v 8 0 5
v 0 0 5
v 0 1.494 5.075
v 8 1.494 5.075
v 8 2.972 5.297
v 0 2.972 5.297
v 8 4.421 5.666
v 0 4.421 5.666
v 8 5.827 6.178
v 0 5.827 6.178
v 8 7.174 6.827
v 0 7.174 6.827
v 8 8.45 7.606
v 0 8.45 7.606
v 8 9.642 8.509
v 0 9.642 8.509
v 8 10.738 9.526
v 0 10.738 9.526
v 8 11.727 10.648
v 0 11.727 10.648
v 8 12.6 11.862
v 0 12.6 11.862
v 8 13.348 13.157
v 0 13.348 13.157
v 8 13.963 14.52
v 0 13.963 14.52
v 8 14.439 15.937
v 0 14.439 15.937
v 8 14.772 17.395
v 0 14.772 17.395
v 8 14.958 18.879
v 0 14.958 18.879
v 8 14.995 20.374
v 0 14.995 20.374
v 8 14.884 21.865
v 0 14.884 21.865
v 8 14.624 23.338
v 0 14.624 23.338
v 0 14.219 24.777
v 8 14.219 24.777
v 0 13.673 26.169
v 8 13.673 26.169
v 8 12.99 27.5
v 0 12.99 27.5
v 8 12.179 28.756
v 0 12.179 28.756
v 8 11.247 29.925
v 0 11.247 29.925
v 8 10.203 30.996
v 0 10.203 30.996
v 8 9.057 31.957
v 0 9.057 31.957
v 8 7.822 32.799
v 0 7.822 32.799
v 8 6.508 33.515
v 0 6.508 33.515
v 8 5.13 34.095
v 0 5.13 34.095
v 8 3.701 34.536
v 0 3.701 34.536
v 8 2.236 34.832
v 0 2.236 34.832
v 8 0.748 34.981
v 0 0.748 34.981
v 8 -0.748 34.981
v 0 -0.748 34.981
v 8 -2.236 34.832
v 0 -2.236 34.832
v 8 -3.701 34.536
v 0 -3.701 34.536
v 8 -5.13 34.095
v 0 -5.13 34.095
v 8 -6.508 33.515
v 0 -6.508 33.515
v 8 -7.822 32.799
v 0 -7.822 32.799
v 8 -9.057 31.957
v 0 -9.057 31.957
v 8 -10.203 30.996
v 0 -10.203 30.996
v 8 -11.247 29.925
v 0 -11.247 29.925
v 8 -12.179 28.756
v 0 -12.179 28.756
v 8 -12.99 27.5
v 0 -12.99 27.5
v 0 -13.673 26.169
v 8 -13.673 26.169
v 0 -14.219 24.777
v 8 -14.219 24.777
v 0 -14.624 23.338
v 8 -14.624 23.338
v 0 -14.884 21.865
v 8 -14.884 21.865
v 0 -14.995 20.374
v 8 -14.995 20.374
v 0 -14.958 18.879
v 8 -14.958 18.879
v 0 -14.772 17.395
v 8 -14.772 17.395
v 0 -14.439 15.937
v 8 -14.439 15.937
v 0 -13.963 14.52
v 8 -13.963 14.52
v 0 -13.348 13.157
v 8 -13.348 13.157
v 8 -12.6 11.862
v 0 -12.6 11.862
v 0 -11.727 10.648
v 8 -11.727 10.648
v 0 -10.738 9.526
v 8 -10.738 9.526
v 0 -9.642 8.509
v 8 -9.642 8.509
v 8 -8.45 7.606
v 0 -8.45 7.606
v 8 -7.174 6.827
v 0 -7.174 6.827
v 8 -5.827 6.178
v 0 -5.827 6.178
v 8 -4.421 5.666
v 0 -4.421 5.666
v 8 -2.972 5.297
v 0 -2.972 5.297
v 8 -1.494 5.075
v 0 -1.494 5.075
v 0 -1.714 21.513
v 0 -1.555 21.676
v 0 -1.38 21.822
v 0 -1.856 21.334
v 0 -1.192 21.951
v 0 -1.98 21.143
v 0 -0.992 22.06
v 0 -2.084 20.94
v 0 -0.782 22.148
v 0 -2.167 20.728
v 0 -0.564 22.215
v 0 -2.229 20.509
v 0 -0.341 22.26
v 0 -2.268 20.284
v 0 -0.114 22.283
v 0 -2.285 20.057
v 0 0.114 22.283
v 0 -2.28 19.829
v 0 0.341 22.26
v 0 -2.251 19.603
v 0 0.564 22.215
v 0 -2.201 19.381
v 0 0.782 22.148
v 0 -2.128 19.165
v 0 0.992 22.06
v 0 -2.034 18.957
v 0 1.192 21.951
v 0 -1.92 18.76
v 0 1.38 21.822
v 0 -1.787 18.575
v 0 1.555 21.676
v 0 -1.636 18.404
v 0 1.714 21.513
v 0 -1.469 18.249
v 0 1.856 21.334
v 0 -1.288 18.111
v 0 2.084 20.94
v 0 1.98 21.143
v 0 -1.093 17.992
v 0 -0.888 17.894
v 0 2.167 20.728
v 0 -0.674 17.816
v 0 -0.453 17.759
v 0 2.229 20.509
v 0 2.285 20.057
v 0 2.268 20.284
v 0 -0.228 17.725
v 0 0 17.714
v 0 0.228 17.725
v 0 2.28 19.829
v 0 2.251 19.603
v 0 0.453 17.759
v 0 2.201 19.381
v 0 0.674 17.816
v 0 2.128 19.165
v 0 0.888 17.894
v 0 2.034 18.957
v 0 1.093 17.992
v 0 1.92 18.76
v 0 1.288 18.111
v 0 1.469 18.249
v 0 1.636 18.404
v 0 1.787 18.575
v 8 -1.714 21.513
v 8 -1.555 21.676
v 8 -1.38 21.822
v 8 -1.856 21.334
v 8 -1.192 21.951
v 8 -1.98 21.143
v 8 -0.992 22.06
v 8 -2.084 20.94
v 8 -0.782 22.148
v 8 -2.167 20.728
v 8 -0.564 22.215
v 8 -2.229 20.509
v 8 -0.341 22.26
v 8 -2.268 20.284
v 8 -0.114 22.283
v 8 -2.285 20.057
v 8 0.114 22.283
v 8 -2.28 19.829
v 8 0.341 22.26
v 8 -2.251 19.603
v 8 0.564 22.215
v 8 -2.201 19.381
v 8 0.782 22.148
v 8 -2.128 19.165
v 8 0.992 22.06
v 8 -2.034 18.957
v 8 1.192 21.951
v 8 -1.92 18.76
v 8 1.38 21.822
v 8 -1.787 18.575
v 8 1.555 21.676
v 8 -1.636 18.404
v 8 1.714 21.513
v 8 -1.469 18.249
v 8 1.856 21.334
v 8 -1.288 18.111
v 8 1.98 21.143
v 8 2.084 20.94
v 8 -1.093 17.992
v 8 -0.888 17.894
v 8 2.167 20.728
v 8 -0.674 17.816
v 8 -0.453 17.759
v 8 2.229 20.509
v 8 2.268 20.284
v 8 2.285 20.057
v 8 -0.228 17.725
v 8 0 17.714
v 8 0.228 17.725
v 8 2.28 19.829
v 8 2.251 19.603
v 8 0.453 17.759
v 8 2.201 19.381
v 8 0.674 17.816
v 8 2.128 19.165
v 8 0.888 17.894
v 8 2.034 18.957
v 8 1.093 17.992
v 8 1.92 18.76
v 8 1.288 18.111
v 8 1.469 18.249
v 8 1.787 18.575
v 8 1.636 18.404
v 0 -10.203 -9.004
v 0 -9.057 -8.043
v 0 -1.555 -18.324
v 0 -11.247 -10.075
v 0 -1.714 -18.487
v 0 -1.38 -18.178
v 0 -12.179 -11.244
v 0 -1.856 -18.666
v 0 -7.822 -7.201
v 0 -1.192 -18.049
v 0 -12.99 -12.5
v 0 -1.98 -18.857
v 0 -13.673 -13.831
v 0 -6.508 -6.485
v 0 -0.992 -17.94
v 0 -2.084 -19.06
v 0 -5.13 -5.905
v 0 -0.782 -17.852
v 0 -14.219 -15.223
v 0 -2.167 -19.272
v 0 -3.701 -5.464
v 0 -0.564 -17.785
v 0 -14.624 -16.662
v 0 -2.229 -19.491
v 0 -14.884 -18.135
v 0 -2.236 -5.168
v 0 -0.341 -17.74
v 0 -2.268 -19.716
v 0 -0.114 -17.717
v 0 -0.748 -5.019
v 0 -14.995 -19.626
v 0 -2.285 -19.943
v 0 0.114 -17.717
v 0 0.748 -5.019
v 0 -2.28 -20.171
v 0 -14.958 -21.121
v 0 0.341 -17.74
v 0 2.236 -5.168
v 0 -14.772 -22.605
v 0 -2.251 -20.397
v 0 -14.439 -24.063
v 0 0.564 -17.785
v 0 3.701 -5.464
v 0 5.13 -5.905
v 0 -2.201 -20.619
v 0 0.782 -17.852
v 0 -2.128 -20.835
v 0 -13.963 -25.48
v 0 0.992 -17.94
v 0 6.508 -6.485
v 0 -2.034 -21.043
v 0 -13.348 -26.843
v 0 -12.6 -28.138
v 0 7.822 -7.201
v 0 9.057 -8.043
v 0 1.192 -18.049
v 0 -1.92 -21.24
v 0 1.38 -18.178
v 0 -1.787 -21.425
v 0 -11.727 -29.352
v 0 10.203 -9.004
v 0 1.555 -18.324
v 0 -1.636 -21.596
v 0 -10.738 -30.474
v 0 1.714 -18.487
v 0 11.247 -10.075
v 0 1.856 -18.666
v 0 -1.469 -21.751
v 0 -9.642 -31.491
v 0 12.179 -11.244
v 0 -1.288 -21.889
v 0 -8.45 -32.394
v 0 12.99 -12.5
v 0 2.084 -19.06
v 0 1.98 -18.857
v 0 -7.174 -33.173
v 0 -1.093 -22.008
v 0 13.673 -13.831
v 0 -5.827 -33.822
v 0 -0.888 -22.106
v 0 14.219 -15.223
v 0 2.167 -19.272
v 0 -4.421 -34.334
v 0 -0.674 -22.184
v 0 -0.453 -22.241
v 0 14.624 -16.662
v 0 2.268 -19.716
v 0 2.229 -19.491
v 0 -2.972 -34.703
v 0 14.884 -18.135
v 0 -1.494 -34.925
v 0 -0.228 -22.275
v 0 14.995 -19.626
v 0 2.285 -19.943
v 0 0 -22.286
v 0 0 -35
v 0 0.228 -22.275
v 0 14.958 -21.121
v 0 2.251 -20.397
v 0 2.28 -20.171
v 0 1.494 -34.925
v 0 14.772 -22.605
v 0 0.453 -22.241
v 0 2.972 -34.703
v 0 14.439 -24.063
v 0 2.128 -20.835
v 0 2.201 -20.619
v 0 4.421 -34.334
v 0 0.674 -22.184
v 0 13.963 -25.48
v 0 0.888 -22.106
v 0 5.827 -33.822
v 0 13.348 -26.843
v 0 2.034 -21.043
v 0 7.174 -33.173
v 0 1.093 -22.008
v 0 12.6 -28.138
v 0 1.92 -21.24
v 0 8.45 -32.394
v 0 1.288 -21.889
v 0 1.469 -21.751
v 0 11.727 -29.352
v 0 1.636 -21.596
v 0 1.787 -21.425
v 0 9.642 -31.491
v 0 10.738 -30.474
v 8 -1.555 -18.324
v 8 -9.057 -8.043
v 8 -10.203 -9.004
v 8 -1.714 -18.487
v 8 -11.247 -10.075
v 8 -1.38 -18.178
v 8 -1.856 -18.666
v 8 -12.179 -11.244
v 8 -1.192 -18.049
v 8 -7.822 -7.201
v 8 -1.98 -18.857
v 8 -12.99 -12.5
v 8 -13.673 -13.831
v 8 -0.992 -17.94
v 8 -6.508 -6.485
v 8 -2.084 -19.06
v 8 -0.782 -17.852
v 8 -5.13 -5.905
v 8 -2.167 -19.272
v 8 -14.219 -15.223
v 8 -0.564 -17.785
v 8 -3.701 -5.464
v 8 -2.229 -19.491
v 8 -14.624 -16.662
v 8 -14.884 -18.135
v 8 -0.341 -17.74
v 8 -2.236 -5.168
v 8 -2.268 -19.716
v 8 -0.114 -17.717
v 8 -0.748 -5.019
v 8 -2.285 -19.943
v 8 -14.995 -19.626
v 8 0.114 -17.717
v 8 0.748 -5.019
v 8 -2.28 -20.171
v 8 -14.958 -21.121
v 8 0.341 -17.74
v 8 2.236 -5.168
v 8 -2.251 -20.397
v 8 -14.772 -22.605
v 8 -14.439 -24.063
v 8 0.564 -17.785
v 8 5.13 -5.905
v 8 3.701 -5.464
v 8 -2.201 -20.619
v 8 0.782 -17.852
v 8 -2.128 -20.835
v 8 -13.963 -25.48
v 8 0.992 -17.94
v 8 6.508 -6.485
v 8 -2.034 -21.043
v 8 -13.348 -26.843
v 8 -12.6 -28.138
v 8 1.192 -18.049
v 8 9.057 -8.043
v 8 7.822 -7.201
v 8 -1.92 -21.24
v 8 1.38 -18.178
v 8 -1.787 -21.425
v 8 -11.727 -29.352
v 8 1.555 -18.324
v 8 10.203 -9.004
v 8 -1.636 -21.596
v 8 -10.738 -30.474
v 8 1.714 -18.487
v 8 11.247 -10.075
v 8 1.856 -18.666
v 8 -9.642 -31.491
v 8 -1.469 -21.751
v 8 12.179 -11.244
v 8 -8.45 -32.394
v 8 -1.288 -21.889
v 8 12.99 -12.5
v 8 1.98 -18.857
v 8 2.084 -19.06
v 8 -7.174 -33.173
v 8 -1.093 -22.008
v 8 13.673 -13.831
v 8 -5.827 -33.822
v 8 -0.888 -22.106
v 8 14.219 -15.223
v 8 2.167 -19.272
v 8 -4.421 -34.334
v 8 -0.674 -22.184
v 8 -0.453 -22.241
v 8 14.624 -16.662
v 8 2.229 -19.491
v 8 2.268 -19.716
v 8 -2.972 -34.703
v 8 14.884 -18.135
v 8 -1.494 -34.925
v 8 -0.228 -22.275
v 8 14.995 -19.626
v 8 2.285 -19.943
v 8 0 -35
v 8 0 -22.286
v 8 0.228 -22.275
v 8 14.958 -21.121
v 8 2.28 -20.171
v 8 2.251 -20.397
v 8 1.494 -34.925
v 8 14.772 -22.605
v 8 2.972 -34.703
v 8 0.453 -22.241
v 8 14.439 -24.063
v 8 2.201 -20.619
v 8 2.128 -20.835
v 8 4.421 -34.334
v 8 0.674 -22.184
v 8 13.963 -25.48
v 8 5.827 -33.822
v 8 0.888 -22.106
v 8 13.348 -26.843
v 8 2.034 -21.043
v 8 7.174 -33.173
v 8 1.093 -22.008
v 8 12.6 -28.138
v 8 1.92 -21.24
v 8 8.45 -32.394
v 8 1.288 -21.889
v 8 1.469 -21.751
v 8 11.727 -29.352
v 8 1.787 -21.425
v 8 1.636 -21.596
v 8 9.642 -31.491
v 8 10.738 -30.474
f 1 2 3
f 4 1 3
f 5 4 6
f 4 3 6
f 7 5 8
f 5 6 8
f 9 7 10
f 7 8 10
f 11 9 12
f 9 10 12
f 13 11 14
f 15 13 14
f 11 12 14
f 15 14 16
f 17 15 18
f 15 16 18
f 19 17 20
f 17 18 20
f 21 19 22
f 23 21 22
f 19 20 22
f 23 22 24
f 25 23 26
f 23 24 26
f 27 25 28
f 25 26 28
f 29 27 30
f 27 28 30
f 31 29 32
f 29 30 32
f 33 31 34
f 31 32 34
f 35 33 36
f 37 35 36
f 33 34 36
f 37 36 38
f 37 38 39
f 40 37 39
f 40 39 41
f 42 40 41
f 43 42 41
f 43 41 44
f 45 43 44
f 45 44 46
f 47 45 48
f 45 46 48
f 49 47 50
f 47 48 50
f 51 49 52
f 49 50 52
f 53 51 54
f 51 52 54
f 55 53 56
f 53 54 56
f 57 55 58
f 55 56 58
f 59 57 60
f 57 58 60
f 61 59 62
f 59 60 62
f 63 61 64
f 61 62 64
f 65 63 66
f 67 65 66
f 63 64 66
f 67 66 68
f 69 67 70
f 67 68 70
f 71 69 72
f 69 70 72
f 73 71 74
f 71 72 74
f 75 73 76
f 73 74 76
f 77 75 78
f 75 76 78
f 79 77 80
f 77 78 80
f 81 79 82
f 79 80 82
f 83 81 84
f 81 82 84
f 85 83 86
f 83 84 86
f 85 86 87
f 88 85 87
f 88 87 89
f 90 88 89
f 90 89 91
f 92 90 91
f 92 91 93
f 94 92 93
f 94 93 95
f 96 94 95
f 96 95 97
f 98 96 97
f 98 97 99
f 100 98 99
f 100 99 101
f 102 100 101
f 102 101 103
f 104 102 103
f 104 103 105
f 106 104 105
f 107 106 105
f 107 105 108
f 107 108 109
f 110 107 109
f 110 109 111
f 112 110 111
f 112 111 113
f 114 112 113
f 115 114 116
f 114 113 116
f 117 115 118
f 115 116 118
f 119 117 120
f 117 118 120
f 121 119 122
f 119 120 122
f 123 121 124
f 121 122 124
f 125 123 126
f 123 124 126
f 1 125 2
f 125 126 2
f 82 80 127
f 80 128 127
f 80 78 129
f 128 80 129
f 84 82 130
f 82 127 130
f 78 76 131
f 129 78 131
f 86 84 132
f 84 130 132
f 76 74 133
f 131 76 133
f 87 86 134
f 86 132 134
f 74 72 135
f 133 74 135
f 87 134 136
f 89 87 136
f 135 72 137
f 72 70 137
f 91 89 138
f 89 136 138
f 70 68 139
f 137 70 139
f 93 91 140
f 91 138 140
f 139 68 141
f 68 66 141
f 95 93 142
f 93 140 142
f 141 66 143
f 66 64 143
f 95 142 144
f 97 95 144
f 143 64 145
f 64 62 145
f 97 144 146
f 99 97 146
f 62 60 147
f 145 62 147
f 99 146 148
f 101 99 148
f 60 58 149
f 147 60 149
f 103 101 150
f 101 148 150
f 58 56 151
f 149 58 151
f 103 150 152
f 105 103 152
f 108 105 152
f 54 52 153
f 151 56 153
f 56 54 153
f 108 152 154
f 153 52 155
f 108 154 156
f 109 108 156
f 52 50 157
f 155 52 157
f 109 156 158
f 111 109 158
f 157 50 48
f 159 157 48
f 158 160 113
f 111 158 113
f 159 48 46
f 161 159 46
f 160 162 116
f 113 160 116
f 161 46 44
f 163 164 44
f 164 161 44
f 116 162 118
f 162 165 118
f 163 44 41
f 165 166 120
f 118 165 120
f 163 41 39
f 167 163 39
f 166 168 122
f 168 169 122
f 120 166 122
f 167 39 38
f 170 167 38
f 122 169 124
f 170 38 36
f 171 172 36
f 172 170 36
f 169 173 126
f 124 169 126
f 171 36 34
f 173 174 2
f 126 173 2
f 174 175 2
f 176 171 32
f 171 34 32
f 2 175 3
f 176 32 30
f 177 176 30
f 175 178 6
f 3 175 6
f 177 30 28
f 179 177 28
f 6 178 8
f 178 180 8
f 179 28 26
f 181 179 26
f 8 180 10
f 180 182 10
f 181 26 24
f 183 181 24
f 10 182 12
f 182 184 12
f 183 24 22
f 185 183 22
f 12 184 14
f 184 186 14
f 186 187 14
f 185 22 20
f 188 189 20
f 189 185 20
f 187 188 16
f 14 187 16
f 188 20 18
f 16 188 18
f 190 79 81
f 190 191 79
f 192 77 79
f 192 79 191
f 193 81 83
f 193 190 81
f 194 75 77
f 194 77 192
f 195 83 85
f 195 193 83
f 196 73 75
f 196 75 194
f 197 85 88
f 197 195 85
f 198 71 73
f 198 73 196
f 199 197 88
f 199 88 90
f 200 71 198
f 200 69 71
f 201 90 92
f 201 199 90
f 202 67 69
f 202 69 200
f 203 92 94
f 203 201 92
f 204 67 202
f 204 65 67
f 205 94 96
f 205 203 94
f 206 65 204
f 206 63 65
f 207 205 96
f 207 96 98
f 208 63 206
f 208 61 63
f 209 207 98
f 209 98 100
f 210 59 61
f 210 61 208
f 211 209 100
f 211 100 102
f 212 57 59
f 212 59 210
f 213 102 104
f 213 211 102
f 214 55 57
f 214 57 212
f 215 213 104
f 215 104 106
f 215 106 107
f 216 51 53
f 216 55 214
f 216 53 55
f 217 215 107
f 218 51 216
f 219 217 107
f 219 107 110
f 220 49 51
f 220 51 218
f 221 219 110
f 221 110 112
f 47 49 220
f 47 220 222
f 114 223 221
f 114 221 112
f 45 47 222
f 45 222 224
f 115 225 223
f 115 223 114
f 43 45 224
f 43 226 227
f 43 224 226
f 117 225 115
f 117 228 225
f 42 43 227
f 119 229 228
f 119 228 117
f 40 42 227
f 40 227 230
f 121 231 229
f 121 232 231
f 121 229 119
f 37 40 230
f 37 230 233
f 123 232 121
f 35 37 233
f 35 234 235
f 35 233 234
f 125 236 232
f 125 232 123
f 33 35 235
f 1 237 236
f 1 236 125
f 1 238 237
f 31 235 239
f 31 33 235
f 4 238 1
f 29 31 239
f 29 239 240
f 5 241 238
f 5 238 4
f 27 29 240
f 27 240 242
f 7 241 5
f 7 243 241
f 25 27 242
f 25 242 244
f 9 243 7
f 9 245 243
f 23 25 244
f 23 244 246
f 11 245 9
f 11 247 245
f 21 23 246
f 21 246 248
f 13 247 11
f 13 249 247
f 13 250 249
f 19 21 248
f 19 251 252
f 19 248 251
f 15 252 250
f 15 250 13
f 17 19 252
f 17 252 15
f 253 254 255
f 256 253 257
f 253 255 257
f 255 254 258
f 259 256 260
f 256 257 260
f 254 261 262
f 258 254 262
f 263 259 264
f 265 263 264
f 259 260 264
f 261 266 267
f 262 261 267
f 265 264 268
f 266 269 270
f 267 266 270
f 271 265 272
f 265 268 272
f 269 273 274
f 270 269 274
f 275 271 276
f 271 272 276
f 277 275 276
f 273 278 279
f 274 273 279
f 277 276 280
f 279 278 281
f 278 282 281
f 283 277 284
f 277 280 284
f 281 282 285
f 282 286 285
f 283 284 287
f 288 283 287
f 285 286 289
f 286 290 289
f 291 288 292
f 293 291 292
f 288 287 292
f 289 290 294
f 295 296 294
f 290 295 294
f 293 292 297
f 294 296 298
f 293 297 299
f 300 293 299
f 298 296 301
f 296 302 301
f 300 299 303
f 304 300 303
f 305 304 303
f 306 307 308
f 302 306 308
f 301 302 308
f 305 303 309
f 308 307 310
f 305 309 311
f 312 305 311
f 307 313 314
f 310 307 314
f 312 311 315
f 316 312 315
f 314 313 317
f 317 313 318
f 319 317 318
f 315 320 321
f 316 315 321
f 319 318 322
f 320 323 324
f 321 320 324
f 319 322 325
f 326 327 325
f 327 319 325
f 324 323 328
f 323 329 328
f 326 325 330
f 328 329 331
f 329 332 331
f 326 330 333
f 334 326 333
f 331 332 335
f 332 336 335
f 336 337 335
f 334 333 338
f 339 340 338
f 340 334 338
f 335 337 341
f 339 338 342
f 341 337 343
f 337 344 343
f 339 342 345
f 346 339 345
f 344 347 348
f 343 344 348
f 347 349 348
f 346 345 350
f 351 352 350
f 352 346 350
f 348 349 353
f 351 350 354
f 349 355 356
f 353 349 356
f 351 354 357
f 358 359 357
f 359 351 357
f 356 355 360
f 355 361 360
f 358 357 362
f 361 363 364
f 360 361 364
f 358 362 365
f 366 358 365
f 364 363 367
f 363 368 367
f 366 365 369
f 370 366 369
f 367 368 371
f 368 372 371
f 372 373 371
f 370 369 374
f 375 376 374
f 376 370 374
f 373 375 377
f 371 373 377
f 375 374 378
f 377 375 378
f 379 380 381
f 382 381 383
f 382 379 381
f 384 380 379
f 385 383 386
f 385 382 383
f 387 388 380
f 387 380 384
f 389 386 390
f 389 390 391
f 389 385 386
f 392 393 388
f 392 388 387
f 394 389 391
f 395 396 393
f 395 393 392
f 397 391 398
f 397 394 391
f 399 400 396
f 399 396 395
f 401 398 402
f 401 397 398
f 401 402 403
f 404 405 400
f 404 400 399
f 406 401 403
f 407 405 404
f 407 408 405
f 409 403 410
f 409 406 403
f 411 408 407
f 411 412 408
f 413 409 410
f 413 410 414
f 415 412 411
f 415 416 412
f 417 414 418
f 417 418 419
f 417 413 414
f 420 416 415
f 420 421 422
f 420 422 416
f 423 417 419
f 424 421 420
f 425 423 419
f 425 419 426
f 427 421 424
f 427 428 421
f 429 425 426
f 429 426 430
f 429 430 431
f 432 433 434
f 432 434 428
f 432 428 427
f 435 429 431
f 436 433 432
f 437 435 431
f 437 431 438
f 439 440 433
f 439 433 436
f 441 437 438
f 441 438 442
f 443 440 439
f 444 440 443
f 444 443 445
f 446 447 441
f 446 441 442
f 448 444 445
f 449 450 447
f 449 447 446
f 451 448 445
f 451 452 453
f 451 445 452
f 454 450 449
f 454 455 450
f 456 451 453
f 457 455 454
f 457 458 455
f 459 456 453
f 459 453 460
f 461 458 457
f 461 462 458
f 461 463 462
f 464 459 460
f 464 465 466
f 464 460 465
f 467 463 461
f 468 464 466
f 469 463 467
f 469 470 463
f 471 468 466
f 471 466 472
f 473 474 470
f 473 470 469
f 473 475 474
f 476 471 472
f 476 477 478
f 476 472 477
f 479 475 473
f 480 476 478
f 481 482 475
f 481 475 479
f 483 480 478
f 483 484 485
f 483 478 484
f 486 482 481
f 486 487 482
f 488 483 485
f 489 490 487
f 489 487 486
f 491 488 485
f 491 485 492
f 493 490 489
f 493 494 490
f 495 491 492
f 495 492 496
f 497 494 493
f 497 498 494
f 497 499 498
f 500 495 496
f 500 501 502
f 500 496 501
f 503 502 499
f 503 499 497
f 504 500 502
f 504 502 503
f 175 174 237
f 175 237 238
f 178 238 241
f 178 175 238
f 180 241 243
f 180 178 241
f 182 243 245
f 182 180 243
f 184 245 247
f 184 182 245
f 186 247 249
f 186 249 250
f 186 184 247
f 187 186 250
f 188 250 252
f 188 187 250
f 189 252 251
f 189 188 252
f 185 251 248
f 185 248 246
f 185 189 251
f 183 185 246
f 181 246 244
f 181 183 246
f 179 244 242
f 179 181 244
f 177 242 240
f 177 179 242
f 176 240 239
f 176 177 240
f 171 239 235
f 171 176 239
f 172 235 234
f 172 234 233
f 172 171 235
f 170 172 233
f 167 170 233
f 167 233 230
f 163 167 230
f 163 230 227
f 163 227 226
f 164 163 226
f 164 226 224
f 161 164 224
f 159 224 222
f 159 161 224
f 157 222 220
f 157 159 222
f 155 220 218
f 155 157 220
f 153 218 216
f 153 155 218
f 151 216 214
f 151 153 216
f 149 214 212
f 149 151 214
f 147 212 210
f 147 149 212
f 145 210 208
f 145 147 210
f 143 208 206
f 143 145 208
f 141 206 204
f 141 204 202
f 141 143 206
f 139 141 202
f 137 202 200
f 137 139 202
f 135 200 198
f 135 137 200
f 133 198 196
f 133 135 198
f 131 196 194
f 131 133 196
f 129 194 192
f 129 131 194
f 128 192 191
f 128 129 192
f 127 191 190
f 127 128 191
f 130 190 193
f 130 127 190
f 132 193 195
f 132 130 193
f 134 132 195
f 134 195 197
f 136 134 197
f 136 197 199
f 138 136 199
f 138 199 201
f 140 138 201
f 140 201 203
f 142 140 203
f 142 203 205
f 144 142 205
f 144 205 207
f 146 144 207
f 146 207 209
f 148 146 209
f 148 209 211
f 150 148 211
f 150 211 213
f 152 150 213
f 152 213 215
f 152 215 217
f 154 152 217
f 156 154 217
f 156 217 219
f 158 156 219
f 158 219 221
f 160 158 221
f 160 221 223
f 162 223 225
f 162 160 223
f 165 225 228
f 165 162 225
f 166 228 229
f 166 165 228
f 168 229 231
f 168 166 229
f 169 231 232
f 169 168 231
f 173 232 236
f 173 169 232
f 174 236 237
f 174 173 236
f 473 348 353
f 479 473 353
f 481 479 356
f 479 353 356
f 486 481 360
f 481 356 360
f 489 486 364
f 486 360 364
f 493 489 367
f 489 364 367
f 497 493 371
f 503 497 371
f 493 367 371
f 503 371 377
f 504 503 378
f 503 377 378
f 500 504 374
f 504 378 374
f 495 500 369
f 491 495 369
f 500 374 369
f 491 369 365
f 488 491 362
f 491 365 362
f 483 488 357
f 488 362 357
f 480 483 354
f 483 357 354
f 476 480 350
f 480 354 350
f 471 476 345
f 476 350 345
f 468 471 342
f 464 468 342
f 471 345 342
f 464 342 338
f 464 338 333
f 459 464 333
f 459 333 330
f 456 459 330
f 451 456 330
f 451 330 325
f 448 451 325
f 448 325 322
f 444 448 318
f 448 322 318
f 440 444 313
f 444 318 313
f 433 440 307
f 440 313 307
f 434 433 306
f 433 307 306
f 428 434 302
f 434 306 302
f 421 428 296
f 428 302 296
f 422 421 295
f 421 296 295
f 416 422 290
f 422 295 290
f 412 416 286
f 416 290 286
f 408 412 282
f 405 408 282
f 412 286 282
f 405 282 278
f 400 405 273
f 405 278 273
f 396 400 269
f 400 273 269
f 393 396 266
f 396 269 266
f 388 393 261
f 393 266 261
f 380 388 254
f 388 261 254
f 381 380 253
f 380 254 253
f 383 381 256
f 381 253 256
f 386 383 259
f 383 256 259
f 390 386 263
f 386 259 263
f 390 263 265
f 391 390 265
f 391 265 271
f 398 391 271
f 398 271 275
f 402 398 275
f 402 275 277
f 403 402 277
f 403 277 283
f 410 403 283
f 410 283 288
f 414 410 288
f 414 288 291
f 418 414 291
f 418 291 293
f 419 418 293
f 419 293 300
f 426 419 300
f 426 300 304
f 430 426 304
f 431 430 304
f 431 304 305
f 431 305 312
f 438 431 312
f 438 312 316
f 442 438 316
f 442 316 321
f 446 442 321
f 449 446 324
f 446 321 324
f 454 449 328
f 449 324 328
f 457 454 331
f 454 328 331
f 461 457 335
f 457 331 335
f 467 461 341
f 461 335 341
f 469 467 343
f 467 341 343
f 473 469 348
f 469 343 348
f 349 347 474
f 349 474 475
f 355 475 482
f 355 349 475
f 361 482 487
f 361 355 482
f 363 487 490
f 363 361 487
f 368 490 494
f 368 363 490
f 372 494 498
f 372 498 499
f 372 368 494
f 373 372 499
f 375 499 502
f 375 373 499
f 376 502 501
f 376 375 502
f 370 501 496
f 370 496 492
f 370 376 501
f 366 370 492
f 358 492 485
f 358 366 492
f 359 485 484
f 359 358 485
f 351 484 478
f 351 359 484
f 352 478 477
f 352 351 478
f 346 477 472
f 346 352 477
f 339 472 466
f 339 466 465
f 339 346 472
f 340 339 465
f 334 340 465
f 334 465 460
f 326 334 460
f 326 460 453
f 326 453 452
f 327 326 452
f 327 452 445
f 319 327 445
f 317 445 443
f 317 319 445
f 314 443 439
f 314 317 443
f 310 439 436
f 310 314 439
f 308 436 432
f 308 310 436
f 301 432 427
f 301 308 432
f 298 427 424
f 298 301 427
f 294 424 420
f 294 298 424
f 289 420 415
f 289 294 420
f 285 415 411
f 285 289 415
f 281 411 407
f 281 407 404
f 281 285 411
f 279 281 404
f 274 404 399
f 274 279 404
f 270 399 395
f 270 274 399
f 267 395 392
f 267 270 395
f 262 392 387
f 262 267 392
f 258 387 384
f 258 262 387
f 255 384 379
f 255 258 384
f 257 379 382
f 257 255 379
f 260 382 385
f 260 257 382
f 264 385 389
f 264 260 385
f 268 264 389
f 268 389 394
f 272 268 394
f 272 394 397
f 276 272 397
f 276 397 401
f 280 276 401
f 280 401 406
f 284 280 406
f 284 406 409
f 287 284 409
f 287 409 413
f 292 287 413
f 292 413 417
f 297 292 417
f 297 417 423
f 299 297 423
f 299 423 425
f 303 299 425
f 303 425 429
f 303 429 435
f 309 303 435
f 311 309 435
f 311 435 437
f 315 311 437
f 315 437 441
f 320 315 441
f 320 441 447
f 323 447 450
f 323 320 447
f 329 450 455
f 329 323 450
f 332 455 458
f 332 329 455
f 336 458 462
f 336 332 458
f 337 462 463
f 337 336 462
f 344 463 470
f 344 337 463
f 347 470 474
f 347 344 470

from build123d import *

# Parameters (mm, degrees)
SKETCH1_R             = 15
SKETCH1_R_2           = 2.286
BOSS_EXTRUDE2_DEPTH   = 8
BOSS_EXTRUDE2_2_DEPTH = 8


with BuildPart() as part:
    # Sketch1 → Boss-Extrude2 (new body)
    with BuildSketch(Plane(origin=(0, 0, 0), x_dir=(0, 0, -1), z_dir=(1, 0, 0))):
        with Locations((-20, 0)):
            Circle(SKETCH1_R)
        with Locations((-20, 0)):
            Circle(SKETCH1_R_2, mode=Mode.SUBTRACT)
    extrude(amount=BOSS_EXTRUDE2_DEPTH)


with BuildPart() as body_2:
    # Sketch1 → Boss-Extrude2 2 (new body)
    with BuildSketch(Plane(origin=(0, 0, 0), x_dir=(0, 0, -1), z_dir=(1, 0, 0))):
        with Locations((20, 0)):
            Circle(SKETCH1_R)
        with Locations((20, 0)):
            Circle(SKETCH1_R_2, mode=Mode.SUBTRACT)
    extrude(amount=BOSS_EXTRUDE2_2_DEPTH)


solid = Compound([part.part, body_2.part])
